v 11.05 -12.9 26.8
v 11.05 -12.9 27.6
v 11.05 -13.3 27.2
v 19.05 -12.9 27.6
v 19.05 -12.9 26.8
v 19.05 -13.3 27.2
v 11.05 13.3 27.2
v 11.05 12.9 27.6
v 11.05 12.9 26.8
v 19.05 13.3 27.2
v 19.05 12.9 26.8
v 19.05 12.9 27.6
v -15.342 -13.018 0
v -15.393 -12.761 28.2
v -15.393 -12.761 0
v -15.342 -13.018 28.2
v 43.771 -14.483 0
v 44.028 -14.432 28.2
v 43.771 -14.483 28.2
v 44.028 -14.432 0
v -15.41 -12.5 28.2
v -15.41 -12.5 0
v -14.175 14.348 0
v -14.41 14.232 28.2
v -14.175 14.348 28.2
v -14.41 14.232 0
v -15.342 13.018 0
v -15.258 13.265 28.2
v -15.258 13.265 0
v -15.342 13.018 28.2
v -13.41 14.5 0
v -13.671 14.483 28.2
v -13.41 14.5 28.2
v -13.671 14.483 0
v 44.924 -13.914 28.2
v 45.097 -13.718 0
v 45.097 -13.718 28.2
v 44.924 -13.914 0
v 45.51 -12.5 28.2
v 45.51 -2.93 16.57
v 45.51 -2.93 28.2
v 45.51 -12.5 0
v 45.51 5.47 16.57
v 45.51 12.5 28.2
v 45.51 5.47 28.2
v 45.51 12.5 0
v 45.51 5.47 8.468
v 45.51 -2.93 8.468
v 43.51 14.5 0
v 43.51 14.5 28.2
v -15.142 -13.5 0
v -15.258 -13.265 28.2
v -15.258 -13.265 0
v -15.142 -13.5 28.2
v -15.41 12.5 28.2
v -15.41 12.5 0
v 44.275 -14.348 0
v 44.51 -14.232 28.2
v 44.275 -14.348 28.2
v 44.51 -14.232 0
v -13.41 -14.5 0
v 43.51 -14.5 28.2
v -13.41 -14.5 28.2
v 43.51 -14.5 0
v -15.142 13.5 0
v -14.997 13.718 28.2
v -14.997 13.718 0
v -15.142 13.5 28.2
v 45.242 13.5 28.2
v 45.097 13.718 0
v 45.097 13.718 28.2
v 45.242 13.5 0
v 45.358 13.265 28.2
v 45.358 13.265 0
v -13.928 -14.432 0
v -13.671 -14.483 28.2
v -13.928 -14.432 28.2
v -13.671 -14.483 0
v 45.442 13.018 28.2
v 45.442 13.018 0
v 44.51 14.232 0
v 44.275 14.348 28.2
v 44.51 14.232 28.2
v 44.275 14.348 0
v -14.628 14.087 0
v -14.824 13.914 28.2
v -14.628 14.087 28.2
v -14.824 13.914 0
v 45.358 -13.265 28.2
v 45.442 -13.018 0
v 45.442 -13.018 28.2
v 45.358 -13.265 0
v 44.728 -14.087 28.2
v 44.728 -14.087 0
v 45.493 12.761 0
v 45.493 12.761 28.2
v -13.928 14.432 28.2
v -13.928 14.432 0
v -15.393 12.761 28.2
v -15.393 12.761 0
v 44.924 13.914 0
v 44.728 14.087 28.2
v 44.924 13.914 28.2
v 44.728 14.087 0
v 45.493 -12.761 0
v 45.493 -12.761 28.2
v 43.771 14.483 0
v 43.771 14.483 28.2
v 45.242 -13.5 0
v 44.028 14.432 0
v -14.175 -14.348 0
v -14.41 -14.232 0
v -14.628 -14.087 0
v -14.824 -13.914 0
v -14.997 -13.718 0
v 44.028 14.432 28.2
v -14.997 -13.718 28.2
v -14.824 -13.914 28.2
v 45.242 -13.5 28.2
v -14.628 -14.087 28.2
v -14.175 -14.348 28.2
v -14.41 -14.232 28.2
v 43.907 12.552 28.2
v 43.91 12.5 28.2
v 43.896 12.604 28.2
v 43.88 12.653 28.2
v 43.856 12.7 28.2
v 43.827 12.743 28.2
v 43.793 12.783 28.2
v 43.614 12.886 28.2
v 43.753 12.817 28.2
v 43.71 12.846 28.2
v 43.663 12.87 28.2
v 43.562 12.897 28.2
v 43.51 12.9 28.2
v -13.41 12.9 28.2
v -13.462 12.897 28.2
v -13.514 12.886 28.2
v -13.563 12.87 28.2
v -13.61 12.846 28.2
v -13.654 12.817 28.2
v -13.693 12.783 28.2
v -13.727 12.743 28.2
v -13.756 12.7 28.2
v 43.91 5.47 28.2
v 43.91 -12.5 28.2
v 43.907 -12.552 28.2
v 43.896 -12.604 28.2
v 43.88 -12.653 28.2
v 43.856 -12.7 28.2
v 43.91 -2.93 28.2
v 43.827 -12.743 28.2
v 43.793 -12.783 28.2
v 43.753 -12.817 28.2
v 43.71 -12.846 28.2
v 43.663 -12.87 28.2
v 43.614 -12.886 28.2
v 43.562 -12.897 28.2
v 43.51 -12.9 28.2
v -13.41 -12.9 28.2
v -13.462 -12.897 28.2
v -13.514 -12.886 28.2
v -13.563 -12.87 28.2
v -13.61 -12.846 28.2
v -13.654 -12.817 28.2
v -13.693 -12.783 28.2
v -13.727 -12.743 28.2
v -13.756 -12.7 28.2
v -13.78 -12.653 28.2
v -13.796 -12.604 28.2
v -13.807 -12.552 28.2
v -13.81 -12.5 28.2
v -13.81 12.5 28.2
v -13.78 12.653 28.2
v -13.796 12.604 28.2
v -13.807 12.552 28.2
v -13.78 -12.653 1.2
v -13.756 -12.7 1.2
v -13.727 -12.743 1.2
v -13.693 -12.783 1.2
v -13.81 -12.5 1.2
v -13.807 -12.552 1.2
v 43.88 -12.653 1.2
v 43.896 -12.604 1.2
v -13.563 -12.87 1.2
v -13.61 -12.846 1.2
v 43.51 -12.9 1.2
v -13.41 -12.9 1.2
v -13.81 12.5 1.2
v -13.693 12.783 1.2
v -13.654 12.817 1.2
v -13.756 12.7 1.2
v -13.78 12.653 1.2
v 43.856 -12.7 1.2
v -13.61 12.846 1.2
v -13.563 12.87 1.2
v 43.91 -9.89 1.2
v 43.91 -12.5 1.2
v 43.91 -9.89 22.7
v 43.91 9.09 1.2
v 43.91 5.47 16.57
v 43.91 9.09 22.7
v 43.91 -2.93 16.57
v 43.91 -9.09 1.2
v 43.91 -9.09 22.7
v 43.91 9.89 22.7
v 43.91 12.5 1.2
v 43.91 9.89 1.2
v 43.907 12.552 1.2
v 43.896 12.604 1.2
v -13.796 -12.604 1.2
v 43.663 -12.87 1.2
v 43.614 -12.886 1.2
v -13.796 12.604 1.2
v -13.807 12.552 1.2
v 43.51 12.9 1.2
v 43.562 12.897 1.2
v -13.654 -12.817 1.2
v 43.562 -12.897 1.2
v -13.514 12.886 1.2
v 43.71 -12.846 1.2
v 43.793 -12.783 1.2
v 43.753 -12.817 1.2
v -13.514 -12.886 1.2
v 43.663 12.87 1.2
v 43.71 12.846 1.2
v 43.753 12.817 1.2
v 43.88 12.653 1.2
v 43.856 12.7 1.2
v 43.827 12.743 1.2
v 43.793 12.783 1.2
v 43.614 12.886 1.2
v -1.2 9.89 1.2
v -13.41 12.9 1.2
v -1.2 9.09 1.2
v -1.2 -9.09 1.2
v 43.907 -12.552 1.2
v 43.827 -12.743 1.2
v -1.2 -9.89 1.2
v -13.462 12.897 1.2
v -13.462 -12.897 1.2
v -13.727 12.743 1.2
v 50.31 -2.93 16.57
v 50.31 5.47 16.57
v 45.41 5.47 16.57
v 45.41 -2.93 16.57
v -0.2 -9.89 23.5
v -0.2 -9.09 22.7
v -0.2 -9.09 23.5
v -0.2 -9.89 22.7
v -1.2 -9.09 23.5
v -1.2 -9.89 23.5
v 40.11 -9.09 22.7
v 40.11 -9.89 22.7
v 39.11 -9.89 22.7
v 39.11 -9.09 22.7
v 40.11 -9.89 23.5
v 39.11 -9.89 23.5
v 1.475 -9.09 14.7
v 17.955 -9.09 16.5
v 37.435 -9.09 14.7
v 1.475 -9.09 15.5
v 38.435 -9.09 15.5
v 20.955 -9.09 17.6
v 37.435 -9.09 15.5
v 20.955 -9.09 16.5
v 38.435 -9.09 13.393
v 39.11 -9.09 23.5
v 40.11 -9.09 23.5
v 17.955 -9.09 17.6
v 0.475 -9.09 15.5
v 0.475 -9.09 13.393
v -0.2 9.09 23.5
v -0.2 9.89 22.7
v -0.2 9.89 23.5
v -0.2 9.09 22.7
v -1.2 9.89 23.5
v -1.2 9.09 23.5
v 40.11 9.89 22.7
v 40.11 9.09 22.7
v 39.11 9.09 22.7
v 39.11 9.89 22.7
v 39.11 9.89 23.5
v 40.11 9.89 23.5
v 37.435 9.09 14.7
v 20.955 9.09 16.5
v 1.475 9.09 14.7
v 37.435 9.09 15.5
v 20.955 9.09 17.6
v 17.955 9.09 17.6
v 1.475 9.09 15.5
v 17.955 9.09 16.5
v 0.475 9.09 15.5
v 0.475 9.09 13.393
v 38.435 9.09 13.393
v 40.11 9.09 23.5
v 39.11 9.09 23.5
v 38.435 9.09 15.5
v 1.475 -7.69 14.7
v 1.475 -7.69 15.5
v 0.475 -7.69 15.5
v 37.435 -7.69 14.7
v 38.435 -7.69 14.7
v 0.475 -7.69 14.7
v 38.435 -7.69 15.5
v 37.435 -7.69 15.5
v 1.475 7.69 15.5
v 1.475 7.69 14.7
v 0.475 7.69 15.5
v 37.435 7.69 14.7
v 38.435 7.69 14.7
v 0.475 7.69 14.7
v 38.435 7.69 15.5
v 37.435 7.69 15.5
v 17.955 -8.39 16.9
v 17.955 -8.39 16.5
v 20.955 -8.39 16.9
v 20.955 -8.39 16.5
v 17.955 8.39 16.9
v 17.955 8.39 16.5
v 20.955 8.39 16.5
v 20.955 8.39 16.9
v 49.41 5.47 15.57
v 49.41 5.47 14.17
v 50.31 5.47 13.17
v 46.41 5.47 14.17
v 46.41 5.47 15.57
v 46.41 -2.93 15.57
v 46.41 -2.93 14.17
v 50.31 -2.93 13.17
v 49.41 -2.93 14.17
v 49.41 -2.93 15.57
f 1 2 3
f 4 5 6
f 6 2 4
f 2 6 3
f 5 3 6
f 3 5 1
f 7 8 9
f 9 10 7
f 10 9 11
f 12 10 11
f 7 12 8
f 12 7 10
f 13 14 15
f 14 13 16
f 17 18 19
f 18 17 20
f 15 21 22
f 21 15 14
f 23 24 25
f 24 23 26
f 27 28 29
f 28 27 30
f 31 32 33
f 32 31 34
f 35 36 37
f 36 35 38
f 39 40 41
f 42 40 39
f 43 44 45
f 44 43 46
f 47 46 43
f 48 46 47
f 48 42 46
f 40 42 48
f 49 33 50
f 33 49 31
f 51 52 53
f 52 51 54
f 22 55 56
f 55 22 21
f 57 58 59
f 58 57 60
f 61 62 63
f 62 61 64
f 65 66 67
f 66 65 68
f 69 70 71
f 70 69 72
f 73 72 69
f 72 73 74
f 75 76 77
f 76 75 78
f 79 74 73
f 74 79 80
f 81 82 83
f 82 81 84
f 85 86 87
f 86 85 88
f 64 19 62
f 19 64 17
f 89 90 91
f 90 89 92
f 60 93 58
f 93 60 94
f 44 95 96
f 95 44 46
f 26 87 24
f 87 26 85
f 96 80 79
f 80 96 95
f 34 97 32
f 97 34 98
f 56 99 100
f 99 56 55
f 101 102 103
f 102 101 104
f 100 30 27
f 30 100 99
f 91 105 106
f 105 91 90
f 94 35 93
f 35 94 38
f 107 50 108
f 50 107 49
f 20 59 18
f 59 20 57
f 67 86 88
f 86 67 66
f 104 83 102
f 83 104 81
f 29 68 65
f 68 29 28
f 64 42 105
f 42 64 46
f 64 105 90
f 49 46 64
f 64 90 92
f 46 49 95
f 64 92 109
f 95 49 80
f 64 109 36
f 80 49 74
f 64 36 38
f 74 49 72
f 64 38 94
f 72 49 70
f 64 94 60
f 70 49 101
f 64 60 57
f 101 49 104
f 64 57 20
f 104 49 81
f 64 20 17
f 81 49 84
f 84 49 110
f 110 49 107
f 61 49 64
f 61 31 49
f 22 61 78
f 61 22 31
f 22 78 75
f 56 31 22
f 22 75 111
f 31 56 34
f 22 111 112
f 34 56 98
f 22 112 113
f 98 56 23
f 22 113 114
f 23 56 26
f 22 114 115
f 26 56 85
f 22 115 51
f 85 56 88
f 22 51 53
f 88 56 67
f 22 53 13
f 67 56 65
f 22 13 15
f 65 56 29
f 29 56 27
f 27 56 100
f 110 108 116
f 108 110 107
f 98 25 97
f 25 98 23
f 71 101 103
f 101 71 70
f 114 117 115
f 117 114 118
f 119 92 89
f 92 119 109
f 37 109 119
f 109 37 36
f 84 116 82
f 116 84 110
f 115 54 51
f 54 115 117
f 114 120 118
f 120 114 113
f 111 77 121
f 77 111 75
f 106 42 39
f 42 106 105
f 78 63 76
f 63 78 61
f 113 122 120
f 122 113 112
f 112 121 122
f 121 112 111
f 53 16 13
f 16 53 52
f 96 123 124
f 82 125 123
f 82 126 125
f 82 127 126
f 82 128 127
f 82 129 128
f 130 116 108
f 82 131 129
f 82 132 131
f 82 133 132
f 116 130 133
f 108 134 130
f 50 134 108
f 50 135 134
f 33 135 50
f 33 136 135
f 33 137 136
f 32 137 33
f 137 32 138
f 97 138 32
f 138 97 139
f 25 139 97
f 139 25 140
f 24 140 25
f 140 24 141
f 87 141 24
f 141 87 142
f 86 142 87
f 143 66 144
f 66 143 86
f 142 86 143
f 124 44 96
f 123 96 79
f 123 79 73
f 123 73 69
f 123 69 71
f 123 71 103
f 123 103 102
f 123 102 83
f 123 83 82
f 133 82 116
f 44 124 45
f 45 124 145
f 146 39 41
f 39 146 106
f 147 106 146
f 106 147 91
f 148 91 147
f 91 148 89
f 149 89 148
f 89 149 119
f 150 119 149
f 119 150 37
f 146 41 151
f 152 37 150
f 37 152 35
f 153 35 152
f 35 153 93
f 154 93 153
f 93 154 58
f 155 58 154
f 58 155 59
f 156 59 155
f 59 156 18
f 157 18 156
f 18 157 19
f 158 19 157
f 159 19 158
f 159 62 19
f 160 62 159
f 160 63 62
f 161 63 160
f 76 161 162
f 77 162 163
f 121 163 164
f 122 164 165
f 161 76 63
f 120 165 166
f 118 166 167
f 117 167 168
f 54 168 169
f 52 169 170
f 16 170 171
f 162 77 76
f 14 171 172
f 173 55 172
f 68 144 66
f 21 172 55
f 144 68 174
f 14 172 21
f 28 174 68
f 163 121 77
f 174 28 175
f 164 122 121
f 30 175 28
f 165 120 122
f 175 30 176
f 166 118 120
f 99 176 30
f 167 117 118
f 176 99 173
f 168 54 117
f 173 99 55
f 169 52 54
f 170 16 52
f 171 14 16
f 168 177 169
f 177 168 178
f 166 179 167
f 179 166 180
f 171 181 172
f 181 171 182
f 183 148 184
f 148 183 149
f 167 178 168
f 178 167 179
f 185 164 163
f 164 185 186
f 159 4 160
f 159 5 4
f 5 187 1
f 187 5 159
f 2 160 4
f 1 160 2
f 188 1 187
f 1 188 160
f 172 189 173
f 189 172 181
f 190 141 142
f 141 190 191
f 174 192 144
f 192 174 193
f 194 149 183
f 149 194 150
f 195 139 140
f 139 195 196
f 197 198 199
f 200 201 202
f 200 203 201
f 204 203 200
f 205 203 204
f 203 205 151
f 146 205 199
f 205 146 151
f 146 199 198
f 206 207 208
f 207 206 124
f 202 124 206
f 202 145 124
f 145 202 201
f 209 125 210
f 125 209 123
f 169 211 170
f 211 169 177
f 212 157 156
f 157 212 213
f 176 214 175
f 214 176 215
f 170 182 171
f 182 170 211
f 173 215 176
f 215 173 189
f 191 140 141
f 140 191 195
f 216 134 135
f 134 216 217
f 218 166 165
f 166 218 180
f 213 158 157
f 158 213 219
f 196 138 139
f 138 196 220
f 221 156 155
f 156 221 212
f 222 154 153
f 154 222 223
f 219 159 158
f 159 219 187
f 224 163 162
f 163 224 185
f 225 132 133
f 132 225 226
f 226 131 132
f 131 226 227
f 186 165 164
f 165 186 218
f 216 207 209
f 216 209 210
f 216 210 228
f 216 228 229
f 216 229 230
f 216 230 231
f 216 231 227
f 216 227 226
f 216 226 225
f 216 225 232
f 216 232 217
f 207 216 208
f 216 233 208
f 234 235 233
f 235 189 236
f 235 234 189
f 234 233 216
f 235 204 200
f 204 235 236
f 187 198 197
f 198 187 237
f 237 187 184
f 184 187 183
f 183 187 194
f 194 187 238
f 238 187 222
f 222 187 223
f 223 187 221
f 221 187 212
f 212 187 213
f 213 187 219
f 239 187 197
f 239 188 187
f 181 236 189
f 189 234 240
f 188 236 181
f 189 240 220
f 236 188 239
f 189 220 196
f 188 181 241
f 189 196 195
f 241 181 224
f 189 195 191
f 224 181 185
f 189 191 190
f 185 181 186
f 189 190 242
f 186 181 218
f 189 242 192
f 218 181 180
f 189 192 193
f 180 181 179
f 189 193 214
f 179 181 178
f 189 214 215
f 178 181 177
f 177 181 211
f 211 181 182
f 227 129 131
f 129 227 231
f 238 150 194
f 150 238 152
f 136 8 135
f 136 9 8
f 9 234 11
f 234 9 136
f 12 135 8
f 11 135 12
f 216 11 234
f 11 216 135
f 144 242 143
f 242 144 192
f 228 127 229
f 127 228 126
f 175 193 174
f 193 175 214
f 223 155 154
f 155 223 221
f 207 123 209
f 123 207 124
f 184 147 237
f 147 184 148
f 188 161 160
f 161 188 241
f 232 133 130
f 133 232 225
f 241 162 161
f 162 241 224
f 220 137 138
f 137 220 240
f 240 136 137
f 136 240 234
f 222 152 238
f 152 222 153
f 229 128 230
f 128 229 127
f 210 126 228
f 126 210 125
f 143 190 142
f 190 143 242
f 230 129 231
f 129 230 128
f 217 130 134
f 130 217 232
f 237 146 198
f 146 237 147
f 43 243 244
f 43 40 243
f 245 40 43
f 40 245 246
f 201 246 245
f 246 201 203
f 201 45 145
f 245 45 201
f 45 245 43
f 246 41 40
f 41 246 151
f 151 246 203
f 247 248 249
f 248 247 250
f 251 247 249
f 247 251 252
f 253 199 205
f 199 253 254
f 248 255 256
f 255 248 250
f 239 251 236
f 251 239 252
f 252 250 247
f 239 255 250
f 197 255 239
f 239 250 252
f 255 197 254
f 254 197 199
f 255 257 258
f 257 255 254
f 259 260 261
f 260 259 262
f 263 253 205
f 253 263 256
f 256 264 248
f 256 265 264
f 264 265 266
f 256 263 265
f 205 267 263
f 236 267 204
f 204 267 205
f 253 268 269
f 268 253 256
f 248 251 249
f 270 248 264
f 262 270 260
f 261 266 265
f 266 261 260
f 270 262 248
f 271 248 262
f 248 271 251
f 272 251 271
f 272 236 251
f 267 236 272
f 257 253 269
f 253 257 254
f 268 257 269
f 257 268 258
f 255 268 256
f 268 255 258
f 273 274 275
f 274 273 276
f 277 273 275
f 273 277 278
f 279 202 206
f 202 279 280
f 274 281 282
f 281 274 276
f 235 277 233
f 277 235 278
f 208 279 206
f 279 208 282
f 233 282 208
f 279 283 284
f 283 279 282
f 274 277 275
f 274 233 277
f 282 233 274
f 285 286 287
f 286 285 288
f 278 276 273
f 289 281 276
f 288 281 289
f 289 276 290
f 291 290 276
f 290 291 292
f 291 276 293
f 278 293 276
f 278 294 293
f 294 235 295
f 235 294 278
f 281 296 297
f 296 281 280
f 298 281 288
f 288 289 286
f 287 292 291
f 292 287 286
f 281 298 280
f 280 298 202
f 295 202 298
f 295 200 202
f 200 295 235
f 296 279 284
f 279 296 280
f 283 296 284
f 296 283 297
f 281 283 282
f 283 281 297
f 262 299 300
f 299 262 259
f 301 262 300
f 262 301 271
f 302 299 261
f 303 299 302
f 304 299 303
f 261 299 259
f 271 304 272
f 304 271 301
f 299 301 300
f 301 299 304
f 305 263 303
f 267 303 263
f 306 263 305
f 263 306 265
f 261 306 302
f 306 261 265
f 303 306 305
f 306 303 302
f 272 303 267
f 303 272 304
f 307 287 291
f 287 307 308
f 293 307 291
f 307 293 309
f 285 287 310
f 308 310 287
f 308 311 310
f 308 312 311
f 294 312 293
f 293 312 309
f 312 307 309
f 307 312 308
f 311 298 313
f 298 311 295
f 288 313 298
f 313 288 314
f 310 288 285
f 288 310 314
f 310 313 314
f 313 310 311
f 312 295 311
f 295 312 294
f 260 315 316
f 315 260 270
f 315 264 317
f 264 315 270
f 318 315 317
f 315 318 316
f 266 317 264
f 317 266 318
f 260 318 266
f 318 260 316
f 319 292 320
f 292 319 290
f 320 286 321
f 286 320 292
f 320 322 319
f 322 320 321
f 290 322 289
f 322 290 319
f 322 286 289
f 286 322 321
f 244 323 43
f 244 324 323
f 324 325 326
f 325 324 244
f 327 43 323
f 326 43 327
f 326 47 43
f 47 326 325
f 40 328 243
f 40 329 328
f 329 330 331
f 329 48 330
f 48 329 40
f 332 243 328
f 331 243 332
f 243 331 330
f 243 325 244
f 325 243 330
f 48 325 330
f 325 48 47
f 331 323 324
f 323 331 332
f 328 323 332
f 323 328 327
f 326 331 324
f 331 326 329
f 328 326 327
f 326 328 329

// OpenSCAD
/* [Part] */
Part = "box"; // [box, lid, assembly]

/* [ESP32] */
ESP32_Length = 38.91; // PCB length (drawing)
ESP32_Width = 25.4; // PCB width (drawing)
ESP32_Thickness = 1.6; // PCB thickness (check on a test print)
ESP32_Top_Height = 5; // PCB underside to the tallest part (check on a test print)
ESP32_Top_Width = 14; // Width of the tall parts on top (check on a test print)
Antenna_Overhang = 5.4; // Antenna module beyond the PCB end (drawing)
USB_Overhang = 0.8; // Micro-USB beyond the PCB end (drawing)
Header_Row_Spacing = 22.86; // Distance between the two pin rows (drawing)
Header_Body_Height = 2.5; // Plastic body of the pin header under the PCB (check on a test print)

/* [Carrier] */
Carrier_Length = 35.56; // Carrier board length (KiCad)
Carrier_Width = 17.78; // Carrier board width (KiCad)
Carrier_Thickness = 1.6; // Carrier board thickness (KiCad)
Carrier_Height = 7; // Carrier underside to the top of the converter (check on a test print)
Carrier_Gap = 1; // Converter top to the ESP32 PCB underside (check on a test print)
Pin_Tail = 3; // Pin tails under the carrier (check on a test print)
Right_Angle_Pin_Height = 1.27; // Pin centre above the carrier top (check on a test print)
Plug_Reach = 16; // Header hole centre to the back of the Dupont housing (check on a test print)

/* [Wiring] */
Dupont_Length = 14; // Dupont housing length on the ESP32 pins (check on a test print)
Dupont_Size = 2.54; // Dupont housing width and height (check on a test print)
Wire_Bend = 5; // Space for wires to bend (check on a test print)
Lead_Width = 8; // CN105 lead width (check on a test print)
Lead_Height = 2; // CN105 lead thickness (check on a test print)
Lead_Crush = 0.3; // How far the lid tab squeezes the lead (check on a test print)
Tie_Width = 3; // Zip tie slot width for the lead tie point (check on a test print; 0 to disable)

/* [Box] */
Wall_Thickness = 1.6; // Side and end wall thickness
Floor_Thickness = 1.2; // Floor thickness
Corner_Radius = 2; // Outside radius of the vertical corners
Board_Clearance = 0.2; // Gap around boards and wiring
Rail_Thickness = 0.8; // Thickness of the two rails that carry the ESP32
Ledge_Width = 1.2; // How far each ledge holds the carrier edge
Nub_Height = 0.8; // Height of the stop nubs above rail and ledge tops
Catch_Reach = 0.5; // How far each rail hook reaches over the carrier edge (check on a test print; 0 to disable)

/* [Lid] */
Lid_Thickness = 1.6; // Lid plate thickness
Lid_Lip_Depth = 2; // How far the lip reaches into the box
Lid_Lip_Thickness = 1.2; // Lip wall thickness
Lid_Clearance = 0.2; // Gap between the lid and the box
Top_Clearance = 0.5; // Gap between the tallest ESP32 part and the lid
Snap_Depth = 0.4; // How far the lid snap bumps stand out of the lip (check on a test print; 0 to disable)
Pry_Width = 6; // Width of the slot that lets a screwdriver lift the lid (check on a test print; 0 to disable)

/* [Preview] */
Show_Lid = false; // Show the lid on the assembly
Show_Section = false; // Cut the assembly lengthwise
Show_Wiring = true; // Show the keep-out volumes, and a translucent lid (hidden when exploded)
Explode = 0; // Distance between exploded layers in mm (0 to disable)

/* [Hidden] */
$fn = 48;
Pitch = 2.54;
Header_Pins = 15;
Carrier_Pins = 5;
Header_Offset = 1.27; // KiCad: pin row offset from the carrier centreline
Edge_Margin = 1.69; // KiCad: pad-free margin along the carrier long edge nearest the pin rows
Converter_Court = 8.275; // KiCad: U_3V3_5V_1 courtyard half-width, wider than both header courtyards (8.12)
J_ESP32_Hole = 5.715; // KiCad: J_ESP32_1 hole row from its carrier end
J_CN105_Hole = 9.525; // KiCad: J_CN105_1 hole row from its carrier end
Nub_Length = 1; // Illustrative: nub length, not checked against a print
Pin_Width = 0.64; // Illustrative: render only
Wire_Radius = 0.35; // Illustrative: render only
Snap_Length = 8; // Illustrative: bump and groove length along the wall
Pry_Height = 0.8; // Illustrative: slot height under the lid plate
Catch_Length = 3; // Illustrative: hook length along the rail
Catch_Tip = 0.4; // Illustrative: hook thickness at its tip
Tie_Block_Length = 4.8; // Illustrative: tie block reach beyond the end wall, short of the lead housing
Tie_Floor = 1; // Illustrative: material between the tie slot and the block top
Tie_Strap = 2.5; // Illustrative: zip tie strap width
Tie_Thickness = 1; // Illustrative: zip tie strap thickness
Tie_Hole_Height = 1.4; // Illustrative: tie slot height
Cable_Fan = 4; // Length over which the CN105 wires gather behind their housings
Module_Width = 13.2; // Illustrative: render only
Module_Base = 0.8; // Illustrative: render only
USB_Width = 7.5; // Illustrative: render only
USB_Length = 5.4; // Illustrative: render only
USB_Height = 2.6; // Illustrative: render only
Converter_Margin = 3.5; // Illustrative: render only
Converter_Half = 5.1; // Illustrative: render only
PAP_Width = 10; // Illustrative: render only, PAP-05V-S housing size
PAP_Height = 5; // Illustrative: render only
PAP_Length = 8; // Illustrative: render only
Jumpers = [ // [carrier pin, ESP32 row side, ESP32 pin index from the antenna end, color]; illustrative pin choice
  [1, 1, 0, "white"],
  [2, -1, 0, "red"],
  [3, -1, 1, "deepskyblue"],
  [4, -1, 5, "yellow"],
  [5, -1, 6, "orange"]
];
Lead_Wires = [[2, "red"], [3, "white"], [4, "yellow"], [5, "orange"]]; // [carrier pin, color]

Carrier_X0 = (ESP32_Length - Carrier_Length) / 2;
Carrier_Z0 = -(Carrier_Gap + Carrier_Height);
Carrier_Top = Carrier_Z0 + Carrier_Thickness;
Carrier_Half = Carrier_Width / 2;
Pin_Z = Carrier_Top + Right_Angle_Pin_Height;
Lead_Bottom = Pin_Z - Lead_Height / 2;
Lead_Top = Pin_Z + Lead_Height / 2;
Plug_Top = Carrier_Top + Dupont_Size;
Carrier_Lift = Explode;
ESP32_Lift = 2 * Explode;
Lid_Lift = 3 * Explode;

Hole_ESP32_X = Carrier_X0 + J_ESP32_Hole;
Hole_CN105_X = Carrier_X0 + Carrier_Length - J_CN105_Hole;
Plug_ESP32_X = Hole_ESP32_X - Plug_Reach;
Plug_CN105_X = Hole_CN105_X + Plug_Reach;

Floor_Top = -(Header_Body_Height + Dupont_Length + Wire_Bend);
Rim_Z = ESP32_Top_Height + Top_Clearance;
Cavity_X0 = Plug_ESP32_X - Wire_Bend - Board_Clearance;
Cavity_X1 = Plug_CN105_X + Board_Clearance;
Cavity_Y = ESP32_Width / 2 + Board_Clearance;

Rail_In = Carrier_Half + Board_Clearance;
Rail_X0 = -Board_Clearance - Nub_Length;
Header_X1 = ESP32_Length / 2 + Header_Pins * Pitch / 2;
Row_Y = Header_Row_Spacing / 2;
Lead_End = Cavity_X1 + Wall_Thickness + 5;
Dupont_Bottom = -(Header_Body_Height + Dupont_Length);
Housing_Gap = Plug_Reach - Dupont_Length;
Block_Half = Lead_Width / 2 + Lid_Clearance;
Tie_X = Cavity_X1 + Wall_Thickness + Tie_Block_Length / 2;
Tie_Z = Lead_Bottom - Tie_Floor - Tie_Hole_Height / 2;
Catch_X = Carrier_X0 + Carrier_Length / 2 - Catch_Length / 2;
Snap_X = (Cavity_X0 + Cavity_X1) / 2 - Snap_Length / 2;
Snap_Z = Lid_Lip_Depth / 2;

assert(Rail_Thickness > 0 && Rail_In + Rail_Thickness <= Row_Y - Dupont_Size / 2,
  "Rails overlap the ESP32 header rows: reduce Rail_Thickness or Board_Clearance");
assert(Ledge_Width > 0 && Ledge_Width < Edge_Margin,
  "Ledge_Width must stay below the carrier pad-free edge margin");
assert(Nub_Height > 0 && Nub_Height < min(ESP32_Thickness, Carrier_Thickness),
  "Nub_Height must stay below both board thicknesses");
assert(Lid_Clearance > 0 && Top_Clearance > 0, "Lid_Clearance and Top_Clearance must be positive");
assert(Corner_Radius > Wall_Thickness, "Corner_Radius must exceed Wall_Thickness");
assert(Explode >= 0, "Explode must be 0 or positive");
assert(Wire_Bend > 2.5, "Wire_Bend must exceed 2.5 for the rendered jumper routing");
assert(Snap_Depth >= 0 && Snap_Depth < Wall_Thickness / 2 && 2 * Snap_Depth < Lid_Lip_Depth,
  "Snap_Depth must be 0 or positive, below half the wall, and the bump (twice as tall) must fit the lip");
assert(Pry_Width >= 0 && Pry_Height > 0 && Pry_Height < Lid_Thickness, "Pry slot must be shallower than the lid plate");
assert(Catch_Reach >= 0 && Carrier_Half - Catch_Reach >= Converter_Court,
  "Catch_Reach would put the hooks over the converter courtyard");
assert(Tie_Width == 0 || (Tie_Width >= Tie_Strap + 0.4 && Tie_Width < Tie_Block_Length - 1.6),
  "Tie_Width must pass the strap with 0.4 mm play and leave 0.8 mm of block each side");
assert(Lead_Crush > 0 && Lead_Crush < Lead_Height, "Lead_Crush must be between 0 and Lead_Height");

module RoundedRect(x0, x1, y0, y1, r) {
  hull()
    for (x = [x0 + r, x1 - r], y = [y0 + r, y1 - r])
      translate([x, y]) circle(r);
}

module Outline() {
  RoundedRect(Cavity_X0 - Wall_Thickness, Cavity_X1 + Wall_Thickness,
    -Cavity_Y - Wall_Thickness, Cavity_Y + Wall_Thickness, Corner_Radius);
}

module Cavity() {
  RoundedRect(Cavity_X0, Cavity_X1, -Cavity_Y, Cavity_Y, Corner_Radius - Wall_Thickness);
}

module Block(x0, x1, y0, y1, z0, z1) {
  translate([x0, y0, z0]) cube([x1 - x0, y1 - y0, z1 - z0]);
}

module Rails() {
  for (s = [-1, 1])
    scale([1, s, 1]) {
      Block(Rail_X0, Cavity_X1 + Wall_Thickness / 2, Rail_In, Rail_In + Rail_Thickness, Floor_Top - 0.1, 0);
      for (x = [Rail_X0, ESP32_Length + Board_Clearance])
        Block(x, x + Nub_Length, Rail_In, Rail_In + Rail_Thickness, 0, Nub_Height);
    }
}

module Ledges() {
  x0 = Carrier_X0 - Board_Clearance - Nub_Length;
  x1 = Carrier_X0 + Carrier_Length + Board_Clearance + Nub_Length;
  inner = Carrier_Half - Ledge_Width;
  for (s = [-1, 1])
    scale([1, s, 1])
      translate([x0, 0, 0]) {
        rotate([90, 0, 90])
          linear_extrude(x1 - x0)
            polygon([[inner, Carrier_Z0], [Rail_In + 0.1, Carrier_Z0],
              [Rail_In + 0.1, Carrier_Z0 - (Rail_In - inner)]]);
        for (x = [0, x1 - x0 - Nub_Length])
          Block(x, x + Nub_Length, inner, Rail_In, Carrier_Z0, Carrier_Z0 + Nub_Height);
      }
}

module Catches() {
  if (Catch_Reach > 0) {
    tip = Carrier_Half - Catch_Reach;
    z0 = Carrier_Top + Board_Clearance;
    for (s = [-1, 1])
      scale([1, s, 1])
        translate([Catch_X, 0, 0])
          rotate([90, 0, 90])
            linear_extrude(Catch_Length)
              polygon([[Rail_In + 0.1, z0], [tip, z0], [tip, z0 + Catch_Tip],
                [Rail_In + 0.1, z0 + Catch_Tip + Rail_In + 0.1 - tip]]);
  }
}

module SnapProfile(y, z) {
  polygon([[y - 0.1, z - Snap_Depth - 0.1], [y + Snap_Depth, z], [y - 0.1, z + Snap_Depth + 0.1]]);
}

module Snaps(y, z) {
  if (Snap_Depth > 0)
    for (s = [-1, 1])
      scale([1, s, 1])
        translate([Snap_X, 0, 0])
          rotate([90, 0, 90])
            linear_extrude(Snap_Length) SnapProfile(y, z);
}

module TieBlock() {
  if (Tie_Width > 0) {
    depth = Tie_Floor + Tie_Hole_Height + 1;
    x0 = Cavity_X1 + Wall_Thickness;
    difference() {
      translate([x0 - 0.1, Header_Offset + Block_Half, Lead_Bottom])
        rotate([90, 0, 0])
          linear_extrude(2 * Block_Half)
            polygon([[0, 0], [Tie_Block_Length + 0.1, 0], [Tie_Block_Length + 0.1, -depth],
              [0, -depth - Tie_Block_Length]]);
      Block(Tie_X - Tie_Width / 2, Tie_X + Tie_Width / 2, Header_Offset - Block_Half - 1,
        Header_Offset + Block_Half + 1, Tie_Z - Tie_Hole_Height / 2, Tie_Z + Tie_Hole_Height / 2);
    }
  }
}

module Notch() {
  Block(Cavity_X1 - 0.1, Cavity_X1 + Wall_Thickness + 0.1,
    Header_Offset - Lead_Width / 2 - Lid_Clearance, Header_Offset + Lead_Width / 2 + Lid_Clearance,
    Lead_Bottom, Rim_Z + 1);
}

module Box(Grooves = true) {
  difference() {
    translate([0, 0, Floor_Top - Floor_Thickness])
      linear_extrude(Rim_Z - Floor_Top + Floor_Thickness) Outline();
    translate([0, 0, Floor_Top]) linear_extrude(Rim_Z - Floor_Top + 1) Cavity();
    Notch();
    if (Grooves) Snaps(Cavity_Y, Rim_Z - Snap_Z);
  }
  Rails();
  Ledges();
  Catches();
  TieBlock();
}

module PrySlot() {
  if (Pry_Width > 0)
    Block(Cavity_X0 - Wall_Thickness - 0.1, Cavity_X0, -Pry_Width / 2, Pry_Width / 2,
      Lid_Thickness - Pry_Height, Lid_Thickness + 0.1);
}

module Lid() {
  tab_bottom = Lead_Top - Lead_Crush;
  difference() {
    linear_extrude(Lid_Thickness) Outline();
    PrySlot();
  }
  Snaps(Cavity_Y - Lid_Clearance, Lid_Thickness + Snap_Z);
  translate([0, 0, Lid_Thickness])
    linear_extrude(Lid_Lip_Depth)
      difference() {
        offset(delta = -Lid_Clearance) Cavity();
        offset(delta = -Lid_Clearance - Lid_Lip_Thickness) Cavity();
      }
  // The lid prints plate down, so turning it over mirrors y.
  Block(Cavity_X1, Cavity_X1 + Wall_Thickness,
    -Header_Offset - Lead_Width / 2, -Header_Offset + Lead_Width / 2,
    Lid_Thickness, Lid_Thickness + Rim_Z - tab_bottom);
}

module LidAssembled() {
  translate([0, 0, Rim_Z + Lid_Thickness]) rotate([180, 0, 0]) Lid();
}

module Boards() {
  Block(0, ESP32_Length, -ESP32_Width / 2, ESP32_Width / 2, 0, ESP32_Thickness);
  Block(-Antenna_Overhang, ESP32_Length + USB_Overhang, -ESP32_Top_Width / 2, ESP32_Top_Width / 2,
    ESP32_Thickness, ESP32_Top_Height);
  for (s = [-1, 1])
    Block(ESP32_Length / 2 - Header_Pins * Pitch / 2, Header_X1,
      s * Row_Y - Dupont_Size / 2, s * Row_Y + Dupont_Size / 2, -Header_Body_Height, 0);
  Block(Carrier_X0, Carrier_X0 + Carrier_Length, -Carrier_Half, Carrier_Half, Carrier_Z0, Carrier_Top);
  Block(Carrier_X0, Carrier_X0 + Carrier_Length, -Converter_Court, Converter_Court, Carrier_Top, -Carrier_Gap);
}

module LeadPath() {
  Block(Plug_CN105_X, Lead_End,
    Header_Offset - Lead_Width / 2, Header_Offset + Lead_Width / 2, Lead_Bottom, Lead_Top);
}

module PlugKeepOut(x0, x1) {
  Block(x0, x1, Header_Offset - Carrier_Pins * Pitch / 2, Header_Offset + Carrier_Pins * Pitch / 2,
    Carrier_Top, Plug_Top);
}

module TailKeepOut(x) {
  reach = (Carrier_Pins - 1) * Pitch / 2 + 0.32;
  Block(x - 0.32, x + 0.32, Header_Offset - reach, Header_Offset + reach,
    Carrier_Z0 - Pin_Tail, Carrier_Z0);
}

module KeepOuts(Lead = true) {
  for (s = [-1, 1])
    Block(Rail_X0, Header_X1, s * Row_Y - Dupont_Size / 2, s * Row_Y + Dupont_Size / 2,
      Floor_Top, -Header_Body_Height);
  Block(Cavity_X0 + Board_Clearance, Rail_X0 - Board_Clearance, -ESP32_Width / 2, ESP32_Width / 2, Floor_Top, Plug_Top);
  PlugKeepOut(Plug_ESP32_X, Hole_ESP32_X);
  PlugKeepOut(Hole_CN105_X, Plug_CN105_X);
  TailKeepOut(Hole_ESP32_X);
  TailKeepOut(Hole_CN105_X);
  if (Lead) LeadPath();
}

function PinY(pin) = Header_Offset + (pin - 3) * Pitch;
function EspPinX(index) = ESP32_Length / 2 - Header_Pins * Pitch / 2 + (index + 0.5) * Pitch;

function JumperPath(pin, side, index) = let(
  k = pin - 1, y = PinY(pin), row_y = side * Row_Y, x = EspPinX(index),
  bend_x = Plug_ESP32_X - 1 - 0.8 * k, low = Dupont_Bottom - 1.4 - (Wire_Bend - 2.5) / 3 * max(k - 1, 0)
) [
  [Plug_ESP32_X, y, Pin_Z + Carrier_Lift],
  [bend_x, y, Pin_Z + Carrier_Lift],
  [bend_x, y, low + Carrier_Lift],
  [bend_x, row_y, low + ESP32_Lift],
  [x, row_y, low + ESP32_Lift],
  [x, row_y, Dupont_Bottom + ESP32_Lift]
];

module Wire(points) {
  for (i = [0 : len(points) - 2])
    hull() {
      translate(points[i]) sphere(Wire_Radius, $fn = 12);
      translate(points[i + 1]) sphere(Wire_Radius, $fn = 12);
    }
}

module Jumpers() {
  for (j = Jumpers) Tint(j[3]) Wire(JumperPath(j[0], j[1], j[2]));
}

module Housing(x0, x1, y) {
  Block(x0, x1, y - (Dupont_Size - 0.1) / 2, y + (Dupont_Size - 0.1) / 2, Carrier_Top, Plug_Top);
}

module HeaderPins(hole_x, toward) {
  Block(hole_x - Pin_Width / 2, hole_x + Pin_Width / 2, Header_Offset - Carrier_Pins * Pitch / 2,
    Header_Offset + Carrier_Pins * Pitch / 2, Carrier_Z0 - Pin_Tail, Carrier_Top);
  for (pin = [1 : Carrier_Pins])
    Block(min(hole_x, hole_x + toward * 8), max(hole_x, hole_x + toward * 8),
      PinY(pin) - Pin_Width / 2, PinY(pin) + Pin_Width / 2, Pin_Z - Pin_Width / 2, Pin_Z + Pin_Width / 2);
}

module RightAngleBody(hole_x) {
  Block(hole_x - Pitch / 2, hole_x + Pitch / 2, Header_Offset - Carrier_Pins * Pitch / 2,
    Header_Offset + Carrier_Pins * Pitch / 2, Carrier_Top, Plug_Top);
}

module CableFan(pin, index) {
  y = PinY(pin);
  strip = Lead_Width / 4;
  center = Header_Offset + (index - 1.5) * strip;
  hull() {
    Block(Plug_CN105_X - Cable_Fan - 0.1, Plug_CN105_X - Cable_Fan, y - 0.4, y + 0.4, Pin_Z - 0.4, Pin_Z + 0.4);
    Block(Plug_CN105_X, Plug_CN105_X + 0.1, center - strip / 2, center + strip / 2, Lead_Bottom, Lead_Top);
  }
  Block(Plug_CN105_X, Lead_End + 1, center - strip / 2, center + strip / 2, Lead_Bottom, Lead_Top);
}

module CarrierDetail(Lead) {
  translate([0, 0, Carrier_Lift]) {
    Tint("forestgreen") Block(Carrier_X0, Carrier_X0 + Carrier_Length, -Carrier_Half, Carrier_Half,
      Carrier_Z0, Carrier_Top);
    Tint("royalblue") Block(Hole_ESP32_X + Converter_Margin, Hole_CN105_X - Converter_Margin,
      -Converter_Half, Converter_Half, Carrier_Top, -Carrier_Gap);
    Tint("black") {
      RightAngleBody(Hole_ESP32_X);
      RightAngleBody(Hole_CN105_X);
    }
    Tint("gold") {
      HeaderPins(Hole_ESP32_X, -1);
      HeaderPins(Hole_CN105_X, 1);
    }
    Tint("dimgray")
      for (pin = [1 : Carrier_Pins])
        Housing(Plug_ESP32_X, Hole_ESP32_X - Housing_Gap, PinY(pin));
    Tint("dimgray")
      for (w = Lead_Wires)
        Housing(Hole_CN105_X + Housing_Gap, Plug_CN105_X - Cable_Fan, PinY(w[0]));
    if (Lead) {
      for (i = [0 : len(Lead_Wires) - 1]) Tint(Lead_Wires[i][1]) CableFan(Lead_Wires[i][0], i);
      Tint("beige")
        Block(Lead_End, Lead_End + PAP_Length, Header_Offset - PAP_Width / 2, Header_Offset + PAP_Width / 2,
          Pin_Z - PAP_Height / 2, Pin_Z + PAP_Height / 2);
    }
  }
}

module ESP32Detail() {
  translate([0, 0, ESP32_Lift]) {
    Tint("seagreen") Block(0, ESP32_Length, -ESP32_Width / 2, ESP32_Width / 2, 0, ESP32_Thickness);
    Tint("dimgray") Block(-Antenna_Overhang, ESP32_Length / 3, -Module_Width / 2, Module_Width / 2,
      ESP32_Thickness, ESP32_Thickness + Module_Base);
    Tint("silver") {
      Block(0, ESP32_Length / 3, -Module_Width / 2, Module_Width / 2,
        ESP32_Thickness + Module_Base, ESP32_Top_Height);
      Block(ESP32_Length + USB_Overhang - USB_Length, ESP32_Length + USB_Overhang, -USB_Width / 2, USB_Width / 2,
        ESP32_Thickness, ESP32_Thickness + USB_Height);
    }
    for (s = [-1, 1]) {
      Tint("black")
        Block(ESP32_Length / 2 - Header_Pins * Pitch / 2, Header_X1, s * Row_Y - Dupont_Size / 2,
          s * Row_Y + Dupont_Size / 2, -Header_Body_Height, 0);
      Tint("gold")
        for (i = [0 : Header_Pins - 1])
          Block(EspPinX(i) - Pin_Width / 2, EspPinX(i) + Pin_Width / 2, s * Row_Y - Pin_Width / 2,
            s * Row_Y + Pin_Width / 2, -Header_Body_Height - Pin_Tail,
            ESP32_Thickness + 0.6);
    }
    Tint("dimgray")
      for (j = Jumpers)
        Block(EspPinX(j[2]) - (Dupont_Size - 0.1) / 2, EspPinX(j[2]) + (Dupont_Size - 0.1) / 2,
          j[1] * Row_Y - Dupont_Size / 2, j[1] * Row_Y + Dupont_Size / 2, Dupont_Bottom, -Header_Body_Height);
  }
}

module ZipTie() {
  t = Tie_Thickness;
  inner = Block_Half + 0.05;
  outer = inner + t;
  top = Lead_Top + t;
  c = Header_Offset;
  Tint("black") {
    Block(Tie_X - Tie_Strap / 2, Tie_X + Tie_Strap / 2, c - outer, c + outer, Tie_Z - t / 2, Tie_Z + t / 2);
    Block(Tie_X - Tie_Strap / 2, Tie_X + Tie_Strap / 2, c - outer, c + outer, Lead_Top, top);
    for (s = [-1, 1])
      Block(Tie_X - Tie_Strap / 2, Tie_X + Tie_Strap / 2, c + min(s * inner, s * outer),
        c + max(s * inner, s * outer), Tie_Z - t / 2, top);
  }
}

module Detail(Lead = true) {
  ESP32Detail();
  CarrierDetail(Lead);
  Jumpers();
  if (Lead && Tie_Width > 0) ZipTie();
}

module Tint(c, a = 1) {
  color(c, a)
    if (Show_Section) difference() { children(); translate([-100, -200, -100]) cube(200); }
    else children();
}

module Assembly() {
  Tint("lightgray") Box();
  Detail();
  if (Show_Wiring && Explode == 0) Tint("orangered", 0.35) KeepOuts();
  if (Show_Lid)
    translate([0, 0, Lid_Lift])
      Tint(Show_Wiring ? "steelblue" : "darkgray", Show_Wiring ? 0.6 : 1) LidAssembled();
}

if (Part == "box") translate([0, 0, -(Floor_Top - Floor_Thickness)]) Box();
if (Part == "lid") Lid();
if (Part == "assembly") Assembly();
